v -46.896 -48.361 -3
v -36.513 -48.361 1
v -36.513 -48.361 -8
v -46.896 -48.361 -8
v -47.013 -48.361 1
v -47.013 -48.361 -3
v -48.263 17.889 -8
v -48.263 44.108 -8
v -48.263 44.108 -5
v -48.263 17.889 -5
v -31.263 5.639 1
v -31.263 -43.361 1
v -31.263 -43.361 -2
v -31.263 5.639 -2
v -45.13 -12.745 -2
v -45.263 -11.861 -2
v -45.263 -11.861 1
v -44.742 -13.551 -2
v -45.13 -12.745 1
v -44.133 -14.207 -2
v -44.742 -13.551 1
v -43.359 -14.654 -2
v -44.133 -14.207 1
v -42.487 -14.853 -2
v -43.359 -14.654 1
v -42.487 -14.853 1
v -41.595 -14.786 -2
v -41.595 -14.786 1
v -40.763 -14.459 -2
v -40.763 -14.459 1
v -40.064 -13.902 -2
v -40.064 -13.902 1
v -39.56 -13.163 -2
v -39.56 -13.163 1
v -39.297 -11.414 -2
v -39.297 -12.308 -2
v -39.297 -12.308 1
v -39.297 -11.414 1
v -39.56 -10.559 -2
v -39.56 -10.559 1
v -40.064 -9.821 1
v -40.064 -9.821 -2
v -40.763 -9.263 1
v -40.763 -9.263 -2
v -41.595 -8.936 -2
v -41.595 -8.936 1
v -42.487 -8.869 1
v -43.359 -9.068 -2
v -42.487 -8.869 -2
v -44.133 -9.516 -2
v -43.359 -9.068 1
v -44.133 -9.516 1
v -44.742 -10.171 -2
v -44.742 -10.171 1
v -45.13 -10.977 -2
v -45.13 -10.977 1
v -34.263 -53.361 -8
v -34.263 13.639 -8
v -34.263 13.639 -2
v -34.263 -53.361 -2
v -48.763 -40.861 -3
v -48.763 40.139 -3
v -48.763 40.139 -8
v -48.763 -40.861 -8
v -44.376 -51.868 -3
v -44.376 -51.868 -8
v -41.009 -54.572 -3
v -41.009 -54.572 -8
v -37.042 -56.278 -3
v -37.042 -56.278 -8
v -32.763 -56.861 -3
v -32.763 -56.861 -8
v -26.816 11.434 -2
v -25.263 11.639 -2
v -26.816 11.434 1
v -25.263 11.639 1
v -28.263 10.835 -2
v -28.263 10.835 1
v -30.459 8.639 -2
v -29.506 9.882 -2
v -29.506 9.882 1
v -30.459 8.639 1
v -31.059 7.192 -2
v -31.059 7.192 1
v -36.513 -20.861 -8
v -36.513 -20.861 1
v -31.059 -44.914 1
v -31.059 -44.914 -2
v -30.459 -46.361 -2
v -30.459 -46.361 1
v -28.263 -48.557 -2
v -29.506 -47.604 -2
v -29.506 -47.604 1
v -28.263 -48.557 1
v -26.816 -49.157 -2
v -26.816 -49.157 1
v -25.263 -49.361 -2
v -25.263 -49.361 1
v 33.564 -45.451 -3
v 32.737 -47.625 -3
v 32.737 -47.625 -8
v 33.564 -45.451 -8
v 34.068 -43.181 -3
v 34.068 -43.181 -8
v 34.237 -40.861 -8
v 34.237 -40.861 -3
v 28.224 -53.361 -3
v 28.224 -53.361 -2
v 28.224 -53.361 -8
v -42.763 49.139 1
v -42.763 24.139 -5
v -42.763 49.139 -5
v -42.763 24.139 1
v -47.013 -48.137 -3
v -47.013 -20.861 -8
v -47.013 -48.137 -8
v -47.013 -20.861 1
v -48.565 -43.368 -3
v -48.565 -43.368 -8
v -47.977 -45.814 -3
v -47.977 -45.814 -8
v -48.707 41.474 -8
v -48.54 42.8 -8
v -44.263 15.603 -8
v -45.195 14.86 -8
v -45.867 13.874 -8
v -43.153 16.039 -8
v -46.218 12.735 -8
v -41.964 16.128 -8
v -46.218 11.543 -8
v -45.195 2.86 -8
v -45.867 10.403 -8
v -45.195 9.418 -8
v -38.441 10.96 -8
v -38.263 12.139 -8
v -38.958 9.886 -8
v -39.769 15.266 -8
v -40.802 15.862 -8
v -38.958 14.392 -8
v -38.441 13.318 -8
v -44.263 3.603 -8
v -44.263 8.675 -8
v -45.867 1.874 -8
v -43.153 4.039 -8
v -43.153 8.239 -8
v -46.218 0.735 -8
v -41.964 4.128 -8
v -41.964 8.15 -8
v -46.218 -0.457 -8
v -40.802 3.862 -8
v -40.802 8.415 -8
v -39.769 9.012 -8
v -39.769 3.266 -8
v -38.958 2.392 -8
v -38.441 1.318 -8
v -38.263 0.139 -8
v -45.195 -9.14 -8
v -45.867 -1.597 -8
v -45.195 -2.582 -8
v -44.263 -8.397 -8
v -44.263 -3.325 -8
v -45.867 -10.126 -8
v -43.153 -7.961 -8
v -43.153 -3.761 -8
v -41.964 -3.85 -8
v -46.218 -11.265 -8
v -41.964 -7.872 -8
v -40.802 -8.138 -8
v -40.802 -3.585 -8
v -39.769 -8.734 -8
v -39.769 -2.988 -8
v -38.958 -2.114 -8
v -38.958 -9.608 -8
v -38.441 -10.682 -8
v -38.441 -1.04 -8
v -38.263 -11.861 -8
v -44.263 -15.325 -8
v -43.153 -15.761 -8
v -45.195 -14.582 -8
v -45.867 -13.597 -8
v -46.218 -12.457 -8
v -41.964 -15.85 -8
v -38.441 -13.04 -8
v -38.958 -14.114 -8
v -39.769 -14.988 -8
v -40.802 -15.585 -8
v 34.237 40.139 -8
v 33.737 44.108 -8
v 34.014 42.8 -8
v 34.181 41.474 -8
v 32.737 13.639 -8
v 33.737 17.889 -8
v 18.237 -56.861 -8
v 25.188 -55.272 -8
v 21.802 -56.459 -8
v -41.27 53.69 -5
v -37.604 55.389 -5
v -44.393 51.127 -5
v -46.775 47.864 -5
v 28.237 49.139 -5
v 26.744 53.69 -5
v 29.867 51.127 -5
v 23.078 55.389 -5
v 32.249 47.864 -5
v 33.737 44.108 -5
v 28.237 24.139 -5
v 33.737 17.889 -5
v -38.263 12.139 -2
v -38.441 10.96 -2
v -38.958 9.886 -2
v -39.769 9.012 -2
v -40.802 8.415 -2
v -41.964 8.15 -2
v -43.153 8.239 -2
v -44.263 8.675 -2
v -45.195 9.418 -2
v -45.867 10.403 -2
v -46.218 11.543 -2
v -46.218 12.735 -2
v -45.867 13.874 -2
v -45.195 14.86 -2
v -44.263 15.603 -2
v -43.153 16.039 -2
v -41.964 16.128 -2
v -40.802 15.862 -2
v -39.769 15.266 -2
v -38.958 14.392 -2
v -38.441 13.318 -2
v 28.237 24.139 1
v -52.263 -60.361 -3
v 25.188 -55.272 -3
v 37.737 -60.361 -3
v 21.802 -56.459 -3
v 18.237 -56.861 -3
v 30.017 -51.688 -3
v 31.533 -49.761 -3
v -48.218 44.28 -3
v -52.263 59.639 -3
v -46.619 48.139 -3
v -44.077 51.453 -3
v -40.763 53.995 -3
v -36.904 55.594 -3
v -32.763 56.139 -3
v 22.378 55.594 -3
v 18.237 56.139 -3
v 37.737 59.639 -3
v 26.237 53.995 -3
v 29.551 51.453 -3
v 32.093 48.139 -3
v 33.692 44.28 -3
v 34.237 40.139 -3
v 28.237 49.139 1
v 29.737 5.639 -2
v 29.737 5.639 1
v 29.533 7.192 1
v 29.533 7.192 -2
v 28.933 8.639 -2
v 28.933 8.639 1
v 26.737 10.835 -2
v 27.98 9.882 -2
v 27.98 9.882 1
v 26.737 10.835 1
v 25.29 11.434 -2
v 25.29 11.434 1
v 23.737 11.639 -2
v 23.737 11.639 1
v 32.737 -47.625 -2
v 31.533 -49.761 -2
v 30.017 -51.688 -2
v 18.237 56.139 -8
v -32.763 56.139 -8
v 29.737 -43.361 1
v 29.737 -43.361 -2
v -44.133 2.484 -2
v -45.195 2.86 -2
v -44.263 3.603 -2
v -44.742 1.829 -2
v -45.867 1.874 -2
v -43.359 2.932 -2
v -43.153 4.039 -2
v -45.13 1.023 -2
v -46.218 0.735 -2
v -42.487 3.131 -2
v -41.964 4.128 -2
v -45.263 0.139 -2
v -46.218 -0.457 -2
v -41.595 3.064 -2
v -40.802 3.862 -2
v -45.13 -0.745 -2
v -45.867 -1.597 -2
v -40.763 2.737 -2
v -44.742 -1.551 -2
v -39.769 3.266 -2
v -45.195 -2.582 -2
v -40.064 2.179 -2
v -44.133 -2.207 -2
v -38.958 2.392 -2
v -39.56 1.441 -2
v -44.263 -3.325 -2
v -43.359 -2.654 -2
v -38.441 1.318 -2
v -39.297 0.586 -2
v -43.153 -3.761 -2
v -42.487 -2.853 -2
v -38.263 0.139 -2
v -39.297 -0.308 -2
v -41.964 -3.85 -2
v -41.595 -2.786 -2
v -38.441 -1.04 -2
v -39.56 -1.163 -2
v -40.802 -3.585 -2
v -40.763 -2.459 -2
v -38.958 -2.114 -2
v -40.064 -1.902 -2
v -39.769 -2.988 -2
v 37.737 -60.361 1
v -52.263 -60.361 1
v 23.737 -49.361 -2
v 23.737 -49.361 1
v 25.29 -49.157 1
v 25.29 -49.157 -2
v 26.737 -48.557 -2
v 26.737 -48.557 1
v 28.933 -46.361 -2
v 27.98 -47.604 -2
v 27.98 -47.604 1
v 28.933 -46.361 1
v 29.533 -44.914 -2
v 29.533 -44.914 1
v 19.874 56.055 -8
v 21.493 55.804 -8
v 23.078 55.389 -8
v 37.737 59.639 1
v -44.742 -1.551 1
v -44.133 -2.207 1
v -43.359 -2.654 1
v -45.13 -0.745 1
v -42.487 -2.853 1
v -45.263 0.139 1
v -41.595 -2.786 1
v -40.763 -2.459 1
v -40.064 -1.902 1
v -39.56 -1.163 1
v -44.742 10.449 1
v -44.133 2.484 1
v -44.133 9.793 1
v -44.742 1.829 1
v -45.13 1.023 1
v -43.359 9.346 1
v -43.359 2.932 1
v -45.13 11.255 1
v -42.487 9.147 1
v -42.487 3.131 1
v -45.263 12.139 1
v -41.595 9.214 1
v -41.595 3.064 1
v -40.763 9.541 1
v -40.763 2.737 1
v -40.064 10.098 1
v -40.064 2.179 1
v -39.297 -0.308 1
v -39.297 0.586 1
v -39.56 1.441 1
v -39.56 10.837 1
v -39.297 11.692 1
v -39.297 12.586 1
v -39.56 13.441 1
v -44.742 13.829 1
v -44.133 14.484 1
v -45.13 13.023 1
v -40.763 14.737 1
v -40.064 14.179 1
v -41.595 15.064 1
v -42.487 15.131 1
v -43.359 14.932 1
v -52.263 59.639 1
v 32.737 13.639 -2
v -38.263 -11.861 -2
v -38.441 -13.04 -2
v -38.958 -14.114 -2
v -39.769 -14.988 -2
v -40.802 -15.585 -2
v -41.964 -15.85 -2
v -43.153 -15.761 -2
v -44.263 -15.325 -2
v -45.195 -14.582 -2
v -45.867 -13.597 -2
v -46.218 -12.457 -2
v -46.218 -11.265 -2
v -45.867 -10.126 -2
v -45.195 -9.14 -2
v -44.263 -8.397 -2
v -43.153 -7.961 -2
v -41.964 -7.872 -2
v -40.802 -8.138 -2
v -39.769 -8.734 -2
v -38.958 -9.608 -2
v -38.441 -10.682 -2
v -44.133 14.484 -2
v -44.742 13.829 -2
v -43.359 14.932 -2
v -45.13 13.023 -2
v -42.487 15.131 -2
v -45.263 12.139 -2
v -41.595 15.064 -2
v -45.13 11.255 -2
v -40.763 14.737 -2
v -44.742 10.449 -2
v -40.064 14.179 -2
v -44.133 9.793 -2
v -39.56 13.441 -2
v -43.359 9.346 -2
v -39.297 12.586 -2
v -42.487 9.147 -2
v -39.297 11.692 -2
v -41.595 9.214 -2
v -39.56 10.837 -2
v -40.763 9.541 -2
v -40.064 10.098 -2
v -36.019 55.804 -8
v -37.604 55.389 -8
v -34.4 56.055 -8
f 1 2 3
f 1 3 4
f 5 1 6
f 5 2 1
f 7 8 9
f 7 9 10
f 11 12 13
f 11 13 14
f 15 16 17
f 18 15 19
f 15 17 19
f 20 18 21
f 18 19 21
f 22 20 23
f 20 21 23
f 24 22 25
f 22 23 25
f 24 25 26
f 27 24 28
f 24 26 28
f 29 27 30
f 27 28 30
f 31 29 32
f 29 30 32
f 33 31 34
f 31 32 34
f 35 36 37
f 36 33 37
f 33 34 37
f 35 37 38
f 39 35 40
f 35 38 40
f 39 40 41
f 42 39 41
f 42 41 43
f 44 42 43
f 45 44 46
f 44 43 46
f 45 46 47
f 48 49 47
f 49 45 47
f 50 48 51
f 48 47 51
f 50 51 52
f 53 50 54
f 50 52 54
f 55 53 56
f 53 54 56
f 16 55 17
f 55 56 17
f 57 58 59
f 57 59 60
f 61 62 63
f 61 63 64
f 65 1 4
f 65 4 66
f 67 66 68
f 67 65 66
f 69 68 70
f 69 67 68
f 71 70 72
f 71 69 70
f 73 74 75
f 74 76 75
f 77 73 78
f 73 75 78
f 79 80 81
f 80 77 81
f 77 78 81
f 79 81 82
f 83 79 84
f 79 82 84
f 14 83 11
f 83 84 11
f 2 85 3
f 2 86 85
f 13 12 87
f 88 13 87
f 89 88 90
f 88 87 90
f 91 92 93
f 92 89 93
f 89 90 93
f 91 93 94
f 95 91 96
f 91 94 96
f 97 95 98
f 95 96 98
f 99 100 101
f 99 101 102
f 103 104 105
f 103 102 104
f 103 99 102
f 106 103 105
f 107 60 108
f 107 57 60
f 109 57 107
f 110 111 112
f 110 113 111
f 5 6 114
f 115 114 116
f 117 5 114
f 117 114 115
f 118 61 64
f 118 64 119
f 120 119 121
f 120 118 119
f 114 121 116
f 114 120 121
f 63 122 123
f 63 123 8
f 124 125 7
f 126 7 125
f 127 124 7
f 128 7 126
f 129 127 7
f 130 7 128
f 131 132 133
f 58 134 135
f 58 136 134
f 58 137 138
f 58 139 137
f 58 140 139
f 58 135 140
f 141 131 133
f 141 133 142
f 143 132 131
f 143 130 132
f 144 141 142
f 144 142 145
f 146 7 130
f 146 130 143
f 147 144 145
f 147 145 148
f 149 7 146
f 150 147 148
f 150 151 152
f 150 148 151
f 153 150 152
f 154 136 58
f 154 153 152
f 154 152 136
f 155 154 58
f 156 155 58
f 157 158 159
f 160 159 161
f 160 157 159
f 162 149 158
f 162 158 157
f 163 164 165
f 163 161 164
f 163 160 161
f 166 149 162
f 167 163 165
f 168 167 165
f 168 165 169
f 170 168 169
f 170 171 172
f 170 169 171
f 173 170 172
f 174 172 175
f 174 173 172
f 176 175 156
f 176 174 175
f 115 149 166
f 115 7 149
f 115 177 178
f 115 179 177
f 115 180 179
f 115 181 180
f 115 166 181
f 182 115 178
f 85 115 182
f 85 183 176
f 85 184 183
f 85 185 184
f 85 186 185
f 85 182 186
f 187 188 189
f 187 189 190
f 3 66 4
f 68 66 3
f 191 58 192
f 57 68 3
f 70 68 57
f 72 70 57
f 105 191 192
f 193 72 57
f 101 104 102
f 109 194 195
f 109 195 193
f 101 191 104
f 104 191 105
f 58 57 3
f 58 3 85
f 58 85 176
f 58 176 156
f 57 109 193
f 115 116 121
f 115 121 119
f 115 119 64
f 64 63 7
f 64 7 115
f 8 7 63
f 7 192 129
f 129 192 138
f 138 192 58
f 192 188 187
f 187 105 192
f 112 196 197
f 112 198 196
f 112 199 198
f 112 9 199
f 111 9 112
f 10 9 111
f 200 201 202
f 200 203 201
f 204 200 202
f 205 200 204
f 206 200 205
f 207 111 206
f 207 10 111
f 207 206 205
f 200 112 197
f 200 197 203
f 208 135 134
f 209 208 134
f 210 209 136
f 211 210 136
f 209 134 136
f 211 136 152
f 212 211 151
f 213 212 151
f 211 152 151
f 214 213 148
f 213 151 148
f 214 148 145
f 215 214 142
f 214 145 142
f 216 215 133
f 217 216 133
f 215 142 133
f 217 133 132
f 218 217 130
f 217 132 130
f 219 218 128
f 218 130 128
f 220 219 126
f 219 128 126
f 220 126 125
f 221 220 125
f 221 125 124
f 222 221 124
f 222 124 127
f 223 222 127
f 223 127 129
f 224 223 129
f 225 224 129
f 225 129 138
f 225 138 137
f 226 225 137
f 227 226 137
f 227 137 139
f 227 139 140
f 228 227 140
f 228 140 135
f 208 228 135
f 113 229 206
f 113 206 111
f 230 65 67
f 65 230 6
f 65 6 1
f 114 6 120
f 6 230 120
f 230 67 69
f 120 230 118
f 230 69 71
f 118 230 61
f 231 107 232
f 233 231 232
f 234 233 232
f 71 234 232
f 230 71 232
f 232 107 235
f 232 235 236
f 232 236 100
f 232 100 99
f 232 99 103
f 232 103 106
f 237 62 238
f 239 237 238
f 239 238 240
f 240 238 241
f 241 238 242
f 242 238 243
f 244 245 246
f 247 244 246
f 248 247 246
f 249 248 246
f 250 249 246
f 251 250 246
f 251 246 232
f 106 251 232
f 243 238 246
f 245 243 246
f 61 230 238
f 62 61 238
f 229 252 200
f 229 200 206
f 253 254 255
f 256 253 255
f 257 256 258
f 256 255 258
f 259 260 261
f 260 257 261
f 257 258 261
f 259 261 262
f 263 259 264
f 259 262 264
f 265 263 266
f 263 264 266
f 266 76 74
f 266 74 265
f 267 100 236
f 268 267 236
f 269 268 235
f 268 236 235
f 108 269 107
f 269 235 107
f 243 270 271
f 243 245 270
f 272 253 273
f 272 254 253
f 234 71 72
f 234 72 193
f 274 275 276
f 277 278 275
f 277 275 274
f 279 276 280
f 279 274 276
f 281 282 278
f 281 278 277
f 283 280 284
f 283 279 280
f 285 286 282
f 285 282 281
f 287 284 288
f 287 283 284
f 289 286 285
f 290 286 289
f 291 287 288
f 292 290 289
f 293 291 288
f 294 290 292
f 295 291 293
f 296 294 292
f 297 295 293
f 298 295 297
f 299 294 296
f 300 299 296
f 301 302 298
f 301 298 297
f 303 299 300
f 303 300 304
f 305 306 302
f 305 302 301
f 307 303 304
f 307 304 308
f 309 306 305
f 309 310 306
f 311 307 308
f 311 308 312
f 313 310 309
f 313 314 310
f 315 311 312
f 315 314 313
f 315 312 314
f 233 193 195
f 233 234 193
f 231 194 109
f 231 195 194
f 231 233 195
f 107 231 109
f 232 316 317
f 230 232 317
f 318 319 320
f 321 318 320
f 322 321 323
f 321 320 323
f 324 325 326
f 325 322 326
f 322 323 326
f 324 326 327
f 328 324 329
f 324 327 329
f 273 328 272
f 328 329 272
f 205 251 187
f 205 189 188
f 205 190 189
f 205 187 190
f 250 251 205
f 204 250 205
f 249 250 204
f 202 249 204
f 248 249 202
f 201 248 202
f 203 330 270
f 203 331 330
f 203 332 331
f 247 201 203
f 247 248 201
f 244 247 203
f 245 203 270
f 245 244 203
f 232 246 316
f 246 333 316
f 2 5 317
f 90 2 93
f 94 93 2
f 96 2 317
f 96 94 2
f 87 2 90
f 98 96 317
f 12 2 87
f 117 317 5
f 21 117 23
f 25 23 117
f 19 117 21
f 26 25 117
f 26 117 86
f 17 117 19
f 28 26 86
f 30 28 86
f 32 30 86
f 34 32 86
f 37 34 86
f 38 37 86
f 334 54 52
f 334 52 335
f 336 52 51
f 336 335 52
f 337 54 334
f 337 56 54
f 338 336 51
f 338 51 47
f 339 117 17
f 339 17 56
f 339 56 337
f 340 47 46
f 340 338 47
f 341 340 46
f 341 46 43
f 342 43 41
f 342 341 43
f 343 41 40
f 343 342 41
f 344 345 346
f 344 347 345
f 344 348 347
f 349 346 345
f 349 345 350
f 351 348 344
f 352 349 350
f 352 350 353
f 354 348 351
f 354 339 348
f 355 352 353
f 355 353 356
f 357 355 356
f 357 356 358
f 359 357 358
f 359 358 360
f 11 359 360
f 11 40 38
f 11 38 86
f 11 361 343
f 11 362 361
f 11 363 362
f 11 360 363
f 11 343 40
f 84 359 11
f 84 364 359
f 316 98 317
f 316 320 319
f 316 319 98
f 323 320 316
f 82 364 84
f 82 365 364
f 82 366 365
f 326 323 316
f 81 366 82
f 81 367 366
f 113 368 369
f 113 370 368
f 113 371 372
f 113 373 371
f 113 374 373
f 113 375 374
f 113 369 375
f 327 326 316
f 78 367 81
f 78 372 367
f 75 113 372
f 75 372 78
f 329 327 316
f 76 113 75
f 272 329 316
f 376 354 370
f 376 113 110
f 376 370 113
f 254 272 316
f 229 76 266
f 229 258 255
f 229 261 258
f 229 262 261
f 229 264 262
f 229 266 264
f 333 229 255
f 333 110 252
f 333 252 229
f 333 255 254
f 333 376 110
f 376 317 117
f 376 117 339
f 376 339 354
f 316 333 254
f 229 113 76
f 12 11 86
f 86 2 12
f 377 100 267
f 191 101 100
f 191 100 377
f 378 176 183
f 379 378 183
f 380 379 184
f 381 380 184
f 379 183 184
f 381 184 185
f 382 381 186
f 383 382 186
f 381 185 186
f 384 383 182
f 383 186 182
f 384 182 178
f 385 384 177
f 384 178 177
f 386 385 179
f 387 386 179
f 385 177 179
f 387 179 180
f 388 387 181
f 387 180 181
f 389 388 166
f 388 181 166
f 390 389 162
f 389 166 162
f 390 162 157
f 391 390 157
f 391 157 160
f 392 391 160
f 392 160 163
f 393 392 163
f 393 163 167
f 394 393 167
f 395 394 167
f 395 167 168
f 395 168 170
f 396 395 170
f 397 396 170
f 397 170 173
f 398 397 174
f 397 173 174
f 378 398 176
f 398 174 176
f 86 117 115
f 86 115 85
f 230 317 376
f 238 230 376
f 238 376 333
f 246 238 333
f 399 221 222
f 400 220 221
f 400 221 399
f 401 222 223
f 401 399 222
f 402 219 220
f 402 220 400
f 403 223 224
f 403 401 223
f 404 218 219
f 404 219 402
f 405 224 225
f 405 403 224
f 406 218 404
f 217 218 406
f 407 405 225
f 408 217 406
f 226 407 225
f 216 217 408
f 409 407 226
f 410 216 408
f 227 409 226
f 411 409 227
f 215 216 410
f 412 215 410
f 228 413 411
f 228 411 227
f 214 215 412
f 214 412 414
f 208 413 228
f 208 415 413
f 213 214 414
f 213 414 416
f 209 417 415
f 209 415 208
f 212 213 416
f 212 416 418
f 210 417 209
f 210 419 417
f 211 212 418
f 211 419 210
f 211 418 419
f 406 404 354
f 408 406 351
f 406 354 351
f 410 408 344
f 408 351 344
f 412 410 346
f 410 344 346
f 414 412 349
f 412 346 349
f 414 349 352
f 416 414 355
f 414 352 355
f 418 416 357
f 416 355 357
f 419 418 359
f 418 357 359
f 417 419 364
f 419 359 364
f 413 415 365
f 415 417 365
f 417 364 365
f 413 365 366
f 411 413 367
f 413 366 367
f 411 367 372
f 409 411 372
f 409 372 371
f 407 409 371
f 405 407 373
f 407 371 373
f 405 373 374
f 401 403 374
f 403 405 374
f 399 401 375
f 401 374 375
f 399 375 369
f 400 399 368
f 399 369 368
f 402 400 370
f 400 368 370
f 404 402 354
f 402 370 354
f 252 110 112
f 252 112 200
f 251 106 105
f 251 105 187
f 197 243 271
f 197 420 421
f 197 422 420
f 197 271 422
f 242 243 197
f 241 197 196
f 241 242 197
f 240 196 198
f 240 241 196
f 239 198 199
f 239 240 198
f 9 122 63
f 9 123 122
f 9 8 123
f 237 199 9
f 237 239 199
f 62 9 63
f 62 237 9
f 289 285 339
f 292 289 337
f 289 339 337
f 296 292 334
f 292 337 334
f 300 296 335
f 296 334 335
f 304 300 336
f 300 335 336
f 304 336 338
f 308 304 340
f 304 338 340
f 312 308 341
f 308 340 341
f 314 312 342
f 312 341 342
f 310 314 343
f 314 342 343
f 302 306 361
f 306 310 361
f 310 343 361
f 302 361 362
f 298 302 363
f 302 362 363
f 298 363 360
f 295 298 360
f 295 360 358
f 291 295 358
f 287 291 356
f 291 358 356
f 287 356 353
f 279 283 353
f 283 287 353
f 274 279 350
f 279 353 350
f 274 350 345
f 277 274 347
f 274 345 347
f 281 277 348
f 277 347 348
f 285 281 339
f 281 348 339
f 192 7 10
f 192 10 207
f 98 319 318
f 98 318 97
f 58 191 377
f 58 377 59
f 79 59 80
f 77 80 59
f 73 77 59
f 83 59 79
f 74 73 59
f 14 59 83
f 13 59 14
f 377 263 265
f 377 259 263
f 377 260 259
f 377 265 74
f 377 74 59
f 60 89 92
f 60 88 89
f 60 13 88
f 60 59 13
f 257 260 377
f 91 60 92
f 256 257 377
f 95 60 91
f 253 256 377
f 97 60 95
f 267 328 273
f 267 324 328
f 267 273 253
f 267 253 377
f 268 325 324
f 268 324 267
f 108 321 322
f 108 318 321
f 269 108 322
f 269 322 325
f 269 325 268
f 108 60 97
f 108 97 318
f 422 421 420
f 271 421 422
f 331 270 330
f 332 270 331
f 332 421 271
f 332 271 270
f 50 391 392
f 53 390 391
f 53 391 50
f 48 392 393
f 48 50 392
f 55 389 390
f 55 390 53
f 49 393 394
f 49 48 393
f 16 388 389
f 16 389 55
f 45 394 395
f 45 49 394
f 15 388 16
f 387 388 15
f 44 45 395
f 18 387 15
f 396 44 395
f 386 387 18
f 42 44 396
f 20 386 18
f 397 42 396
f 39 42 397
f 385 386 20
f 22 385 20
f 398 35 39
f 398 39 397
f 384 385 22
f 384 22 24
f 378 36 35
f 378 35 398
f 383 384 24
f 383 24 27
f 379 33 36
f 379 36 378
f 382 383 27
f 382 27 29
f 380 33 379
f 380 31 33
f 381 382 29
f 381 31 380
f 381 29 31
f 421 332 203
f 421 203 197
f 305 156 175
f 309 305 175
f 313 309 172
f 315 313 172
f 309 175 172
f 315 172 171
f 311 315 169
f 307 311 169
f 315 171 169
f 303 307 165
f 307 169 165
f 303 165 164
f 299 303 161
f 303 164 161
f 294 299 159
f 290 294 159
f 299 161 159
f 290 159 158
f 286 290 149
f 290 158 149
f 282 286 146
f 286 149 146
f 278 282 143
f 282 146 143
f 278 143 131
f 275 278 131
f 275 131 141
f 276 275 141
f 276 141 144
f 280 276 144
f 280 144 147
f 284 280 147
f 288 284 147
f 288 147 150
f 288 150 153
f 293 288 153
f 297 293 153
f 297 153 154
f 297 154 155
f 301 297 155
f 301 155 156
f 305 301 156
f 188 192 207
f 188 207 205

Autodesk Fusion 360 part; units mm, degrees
sketch "Skizze1" plane through (0, 0, 0) normal (0, 0, 1) x (1, 0, 0)
  line L0 (-52.263, 59.6389) -> (37.737, 59.6389)
  line L1 (37.737, 59.6389) -> (37.737, -60.3611)
  line L2 (37.737, -60.3611) -> (-52.263, -60.3611)
  line L3 (-52.263, -60.3611) -> (-52.263, 59.6389)
  dimension "d1" = 90
  dimension "d2" = 120
extrude "Extrusion1" add sketch "Skizze1" against normal blind 3
extrude "Extrusion2" add 1 faces at (-22.263, 19.6389, 0) along direction (0, 0, 1) blind 1
sketch "Skizze2" plane through (0, 0, 1) normal (0, 0, 1) x (-1, 0, 0)
  line L0 (52.263, 60.3611) -> (-37.737, 60.3611)
  line L1 (-37.737, 60.3611) -> (-37.737, -59.6389)
  line L2 (-37.737, -59.6389) -> (52.263, -59.6389)
  line L3 (52.263, -59.6389) -> (52.263, 60.3611)
  line L4 (25.263, -11.6389) -> (-23.737, -11.6389)
  line L5 (-29.737, -5.6389) -> (-29.737, 43.3611)
  line L6 (-23.737, 49.3611) -> (25.263, 49.3611)
  line L7 (31.263, 43.3611) -> (31.263, -5.6389)
  line L8 (33.263, -12.6389) -> (-31.737, -12.6389)
  line L9 (-31.737, -12.6389) -> (-31.737, 52.3611)
  line L10 (-31.737, 52.3611) -> (33.263, 52.3611)
  line L11 (33.263, 52.3611) -> (33.263, -12.6389)
  line L12 (42.763, -49.1389) -> (-28.237, -49.1389)
  line L13 (-28.237, -49.1389) -> (-28.237, -24.1389)
  line L14 (-28.237, -24.1389) -> (42.763, -24.1389)
  line L15 (42.763, -24.1389) -> (42.763, -49.1389)
  circle A0 centre (42.263, -12.1389) radius 3
  circle A1 centre (42.263, -0.1389) radius 3
  circle A2 centre (42.263, 11.8611) radius 3
  line L16 (47.013, 20.8611) -> (36.513, 20.8611)
  line L17 (36.513, 20.8611) -> (36.513, 48.3611)
  line L18 (36.513, 48.3611) -> (47.013, 48.3611)
  line L19 (47.013, 48.3611) -> (47.013, 20.8611)
  arc A3 (-29.737, -5.6389) -> (-23.737, -11.6389) centre (-23.737, -5.6389) ccw
  arc A4 (25.263, -11.6389) -> (31.263, -5.6389) centre (25.263, -5.6389) ccw
  arc A5 (31.263, 43.3611) -> (25.263, 49.3611) centre (25.263, 43.3611) ccw
  arc A6 (-23.737, 49.3611) -> (-29.737, 43.3611) centre (-23.737, 43.3611) ccw
  point P0 (31.263, -11.6389)
  point P1 (-29.737, -11.6389)
  point P2 (31.263, 49.3611)
  dimension "d7" = 61
  dimension "d8" = 61
  dimension "d10" = 11
  dimension "d11" = 65
  dimension "d12" = 65
  dimension "d13" = 8
  dimension "d19" = 25
  dimension "d20" = 71
  dimension "d23" = 8
  dimension "d24" = 6
  dimension "d25" = 6
  dimension "d26" = 9
  dimension "d28" = 6
  dimension "d29" = 6
  dimension "d30" = 12
  dimension "d31" = 9
  dimension "d32" = 9
  dimension "d33" = 12
  dimension "d34" = 10.5
  dimension "d35" = 27.5
  dimension "d36" = 12
  dimension "d37" = 5.25
  dimension "d62" = 6
  dimension "d63" = 6
  dimension "d82" = 12
sketch "Skizze3" plane through (0, 0, -3) normal (0, 0, -1) x (1, 0, 0)
  line L0 (37.737, 60.3611) -> (-52.263, 60.3611)
  line L1 (-52.263, 60.3611) -> (-52.263, -59.6389)
  line L2 (-52.263, -59.6389) -> (37.737, -59.6389)
  line L3 (37.737, -59.6389) -> (37.737, 60.3611)
  line L4 (-32.763, 56.8611) -> (18.237, 56.8611)
  line L5 (34.237, 40.8611) -> (34.237, -56.1389)
  line L6 (34.237, -56.1389) -> (-48.763, -56.1389)
  line L7 (-48.763, -56.1389) -> (-48.763, 40.8611)
  arc A0 (34.237, 40.8611) -> (18.237, 56.8611) centre (18.237, 40.8611) ccw
  arc A1 (-32.763, 56.8611) -> (-48.763, 40.8611) centre (-32.763, 40.8611) ccw
  line L8 (-52.263, 0.3611) -> (37.737, 0.3611)
  arc A2 (-48.763, -40.1389) -> (-32.763, -56.1389) centre (-32.763, -40.1389) ccw
  arc A3 (18.237, -56.1389) -> (34.237, -40.1389) centre (18.237, -40.1389) ccw
  dimension "d38" = 3.5
  dimension "d39" = 3.5
  dimension "d40" = 3.5
  dimension "d41" = 3.5
  dimension "d45" = 16
  dimension "d46" = 16
extrude "Extrusion3" add sketch "Skizze3" along normal blind 5 contours L4 L5 L7 A0 A1 L8 | L5 L6 L7 L8 A2 A3
extrude "Extrusion4" cut sketch "Skizze2" against normal blind 9 contours A1
extrude "Extrusion5" cut sketch "Skizze2" against normal blind 9 contours A0 | A2
sketch "Skizze4" plane through (0, 0, -8) normal (0, 0, -1) x (1, 0, 0)
  circle A0 centre (-42.263, -12.1389) radius 3
  circle A1 centre (-42.263, 11.8611) radius 3
  circle A2 centre (-42.263, -0.1389) radius 3
  arc A3 (-48.763, -40.1389) -> (-32.763, -56.1389) centre (-32.763, -40.1389) ccw
  line L0 (-32.763, -56.1389) -> (18.237, -56.1389)
  arc A4 (18.237, -56.1389) -> (34.237, -40.1389) centre (18.237, -40.1389) ccw
  line L1 (34.237, -40.1389) -> (34.237, 40.8611)
  arc A5 (34.237, 40.8611) -> (18.237, 56.8611) centre (18.237, 40.8611) ccw
  line L2 (18.237, 56.8611) -> (-32.763, 56.8611)
  arc A6 (-32.763, 56.8611) -> (-48.763, 40.8611) centre (-32.763, 40.8611) ccw
  line L3 (-48.763, 40.8611) -> (-48.763, -40.1389)
  circle A7 centre (-42.263, 11.8611) radius 4
  circle A8 centre (-42.263, -0.1389) radius 4
  circle A9 centre (-42.263, -12.1389) radius 4
  dimension "d53" = 8
  dimension "d54" = 8
  dimension "d55" = 8
extrude "Extrusion6" cut sketch "Skizze4" against normal blind 6 contours A7 | A8 | A9
extrude "Extrusion7" cut sketch "Skizze2" against normal blind 9 contours L16 L17 L18 L19
extrude "Extrusion8" cut sketch "Skizze2" against normal blind 9 contours L12 L13 L14 L15
extrude "Extrusion9" cut sketch "Skizze2" against normal blind 9 contours L4 L5 L6 L7 A3 A4 A5 A6
sketch "Skizze5" plane through (0, 0, -8) normal (0, 0, -1) x (1, 0, 0)
  line L0 (-25.263, 49.3611) -> (23.737, 49.3611)
  arc A0 (29.737, 43.3611) -> (23.737, 49.3611) centre (23.737, 43.3611) ccw
  line L1 (29.737, 43.3611) -> (29.737, -5.6389)
  arc A1 (23.737, -11.6389) -> (29.737, -5.6389) centre (23.737, -5.6389) ccw
  line L2 (23.737, -11.6389) -> (-25.263, -11.6389)
  arc A2 (-31.263, -5.6389) -> (-25.263, -11.6389) centre (-25.263, -5.6389) ccw
  line L3 (-31.263, -5.6389) -> (-31.263, 43.3611)
  arc A3 (-25.263, 49.3611) -> (-31.263, 43.3611) centre (-25.263, 43.3611) ccw
  line L4 (28.237, -24.1389) -> (28.237, -49.1389)
  line L5 (28.237, -49.1389) -> (-42.763, -49.1389)
  line L6 (-42.763, -49.1389) -> (-42.763, -24.1389)
  line L7 (-42.763, -24.1389) -> (28.237, -24.1389)
  line L8 (-47.013, 20.8611) -> (-47.013, 48.1369)
  arc A4 (-47.013, 48.1369) -> (-48.763, 40.8611) centre (-32.763, 40.8611) ccw
  line L9 (-48.763, 40.8611) -> (-48.763, -40.1389)
  arc A5 (-48.763, -40.1389) -> (-32.763, -56.1389) centre (-32.763, -40.1389) ccw
  line L10 (-32.763, -56.1389) -> (18.237, -56.1389)
  arc A6 (18.237, -56.1389) -> (34.237, -40.1389) centre (18.237, -40.1389) ccw
  line L11 (34.237, -40.1389) -> (34.237, 40.8611)
  arc A7 (34.237, 40.8611) -> (18.237, 56.8611) centre (18.237, 40.8611) ccw
  line L12 (18.237, 56.8611) -> (-32.763, 56.8611)
  arc A8 (-32.763, 56.8611) -> (-46.8963, 48.3611) centre (-32.763, 40.8611) ccw
  line L13 (-46.8963, 48.3611) -> (-36.513, 48.3611)
  line L14 (-36.513, 48.3611) -> (-36.513, 20.8611)
  line L15 (-36.513, 20.8611) -> (-47.013, 20.8611)
  circle A9 centre (-42.263, 11.8611) radius 4
  circle A10 centre (-42.263, -0.1389) radius 4
  circle A11 centre (-42.263, -12.1389) radius 4
  line L16 (32.737, -13.6389) -> (-34.263, -13.6389)
  line L17 (-34.263, -13.6389) -> (-34.263, 53.3611)
  line L18 (-34.263, 53.3611) -> (32.737, 53.3611)
  line L19 (32.737, 53.3611) -> (32.737, -13.6389)
  line L20 (37.737, 60.3611) -> (37.737, -59.6389)
  line L21 (-52.263, 60.3611) -> (37.737, 60.3611)
  dimension "d66" = 67
  dimension "d67" = 67
  dimension "d68" = 5
  dimension "d69" = 7
extrude "Extrusion10" cut sketch "Skizze5" against normal blind 6 contours A7 L16 L17 L18 L19
sketch "Skizze6" plane through (0, 0, 1) normal (0, 0, 1) x (-1, 0, 0)
  line L0 (42.763, -49.1389) -> (-28.237, -49.1389)
  line L1 (-28.237, -49.1389) -> (-28.237, -24.1389)
sketch "Skizze7" plane through (0, 0, -8) normal (0, 0, -1) x (1, 0, 0)
  line L0 (-34.263, 53.3611) -> (28.2245, 53.3611)
  arc A0 (28.2245, 53.3611) -> (18.237, 56.8611) centre (18.237, 40.8611) ccw
  line L1 (18.237, 56.8611) -> (-32.763, 56.8611)
  arc A1 (-32.763, 56.8611) -> (-46.8963, 48.3611) centre (-32.763, 40.8611) ccw
  line L2 (-46.8963, 48.3611) -> (-36.513, 48.3611)
  line L3 (-36.513, 48.3611) -> (-36.513, 20.8611)
  line L4 (-36.513, 20.8611) -> (-47.013, 20.8611)
  line L5 (-47.013, 20.8611) -> (-47.013, 48.1369)
  arc A2 (-47.013, 48.1369) -> (-48.763, 40.8611) centre (-32.763, 40.8611) ccw
  line L6 (-48.763, 40.8611) -> (-48.763, -40.1389)
  arc A3 (-48.763, -40.1389) -> (-32.763, -56.1389) centre (-32.763, -40.1389) ccw
  line L7 (-32.763, -56.1389) -> (18.237, -56.1389)
  arc A4 (18.237, -56.1389) -> (34.237, -40.1389) centre (18.237, -40.1389) ccw
  line L8 (34.237, -40.1389) -> (34.237, 40.8611)
  arc A5 (34.237, 40.8611) -> (32.737, 47.625) centre (18.237, 40.8611) ccw
  line L9 (32.737, 47.625) -> (32.737, -13.6389)
  line L10 (32.737, -13.6389) -> (-34.263, -13.6389)
  line L11 (-34.263, -13.6389) -> (-34.263, 53.3611)
  line L12 (28.237, -24.1389) -> (28.237, -49.1389)
  line L13 (28.237, -49.1389) -> (-42.763, -49.1389)
  line L14 (-42.763, -49.1389) -> (-42.763, -24.1389)
  line L15 (-42.763, -24.1389) -> (28.237, -24.1389)
  circle A6 centre (-42.263, 11.8611) radius 4
  circle A7 centre (-42.263, -0.1389) radius 4
  circle A8 centre (-42.263, -12.1389) radius 4
  line L16 (33.737, -55.3889) -> (-48.263, -55.3889)
  line L17 (-48.263, -55.3889) -> (-48.263, -17.8889)
  line L18 (-48.263, -17.8889) -> (33.737, -17.8889)
  line L19 (33.737, -17.8889) -> (33.737, -55.3889)
  line L20 (-42.763, -49.1389) -> (28.237, -49.1389)
  line L21 (28.237, -49.1389) -> (28.237, -24.1389)
  dimension "d76" = 82
  dimension "d77" = 37.5
  dimension "d78" = 6.25
  dimension "d79" = 5.5
extrude "Extrusion11" cut sketch "Skizze7" against normal blind 3 contours A4 L16 L19 | A3 A4 L16 L17 L18 L19 | A3 L16 L17
